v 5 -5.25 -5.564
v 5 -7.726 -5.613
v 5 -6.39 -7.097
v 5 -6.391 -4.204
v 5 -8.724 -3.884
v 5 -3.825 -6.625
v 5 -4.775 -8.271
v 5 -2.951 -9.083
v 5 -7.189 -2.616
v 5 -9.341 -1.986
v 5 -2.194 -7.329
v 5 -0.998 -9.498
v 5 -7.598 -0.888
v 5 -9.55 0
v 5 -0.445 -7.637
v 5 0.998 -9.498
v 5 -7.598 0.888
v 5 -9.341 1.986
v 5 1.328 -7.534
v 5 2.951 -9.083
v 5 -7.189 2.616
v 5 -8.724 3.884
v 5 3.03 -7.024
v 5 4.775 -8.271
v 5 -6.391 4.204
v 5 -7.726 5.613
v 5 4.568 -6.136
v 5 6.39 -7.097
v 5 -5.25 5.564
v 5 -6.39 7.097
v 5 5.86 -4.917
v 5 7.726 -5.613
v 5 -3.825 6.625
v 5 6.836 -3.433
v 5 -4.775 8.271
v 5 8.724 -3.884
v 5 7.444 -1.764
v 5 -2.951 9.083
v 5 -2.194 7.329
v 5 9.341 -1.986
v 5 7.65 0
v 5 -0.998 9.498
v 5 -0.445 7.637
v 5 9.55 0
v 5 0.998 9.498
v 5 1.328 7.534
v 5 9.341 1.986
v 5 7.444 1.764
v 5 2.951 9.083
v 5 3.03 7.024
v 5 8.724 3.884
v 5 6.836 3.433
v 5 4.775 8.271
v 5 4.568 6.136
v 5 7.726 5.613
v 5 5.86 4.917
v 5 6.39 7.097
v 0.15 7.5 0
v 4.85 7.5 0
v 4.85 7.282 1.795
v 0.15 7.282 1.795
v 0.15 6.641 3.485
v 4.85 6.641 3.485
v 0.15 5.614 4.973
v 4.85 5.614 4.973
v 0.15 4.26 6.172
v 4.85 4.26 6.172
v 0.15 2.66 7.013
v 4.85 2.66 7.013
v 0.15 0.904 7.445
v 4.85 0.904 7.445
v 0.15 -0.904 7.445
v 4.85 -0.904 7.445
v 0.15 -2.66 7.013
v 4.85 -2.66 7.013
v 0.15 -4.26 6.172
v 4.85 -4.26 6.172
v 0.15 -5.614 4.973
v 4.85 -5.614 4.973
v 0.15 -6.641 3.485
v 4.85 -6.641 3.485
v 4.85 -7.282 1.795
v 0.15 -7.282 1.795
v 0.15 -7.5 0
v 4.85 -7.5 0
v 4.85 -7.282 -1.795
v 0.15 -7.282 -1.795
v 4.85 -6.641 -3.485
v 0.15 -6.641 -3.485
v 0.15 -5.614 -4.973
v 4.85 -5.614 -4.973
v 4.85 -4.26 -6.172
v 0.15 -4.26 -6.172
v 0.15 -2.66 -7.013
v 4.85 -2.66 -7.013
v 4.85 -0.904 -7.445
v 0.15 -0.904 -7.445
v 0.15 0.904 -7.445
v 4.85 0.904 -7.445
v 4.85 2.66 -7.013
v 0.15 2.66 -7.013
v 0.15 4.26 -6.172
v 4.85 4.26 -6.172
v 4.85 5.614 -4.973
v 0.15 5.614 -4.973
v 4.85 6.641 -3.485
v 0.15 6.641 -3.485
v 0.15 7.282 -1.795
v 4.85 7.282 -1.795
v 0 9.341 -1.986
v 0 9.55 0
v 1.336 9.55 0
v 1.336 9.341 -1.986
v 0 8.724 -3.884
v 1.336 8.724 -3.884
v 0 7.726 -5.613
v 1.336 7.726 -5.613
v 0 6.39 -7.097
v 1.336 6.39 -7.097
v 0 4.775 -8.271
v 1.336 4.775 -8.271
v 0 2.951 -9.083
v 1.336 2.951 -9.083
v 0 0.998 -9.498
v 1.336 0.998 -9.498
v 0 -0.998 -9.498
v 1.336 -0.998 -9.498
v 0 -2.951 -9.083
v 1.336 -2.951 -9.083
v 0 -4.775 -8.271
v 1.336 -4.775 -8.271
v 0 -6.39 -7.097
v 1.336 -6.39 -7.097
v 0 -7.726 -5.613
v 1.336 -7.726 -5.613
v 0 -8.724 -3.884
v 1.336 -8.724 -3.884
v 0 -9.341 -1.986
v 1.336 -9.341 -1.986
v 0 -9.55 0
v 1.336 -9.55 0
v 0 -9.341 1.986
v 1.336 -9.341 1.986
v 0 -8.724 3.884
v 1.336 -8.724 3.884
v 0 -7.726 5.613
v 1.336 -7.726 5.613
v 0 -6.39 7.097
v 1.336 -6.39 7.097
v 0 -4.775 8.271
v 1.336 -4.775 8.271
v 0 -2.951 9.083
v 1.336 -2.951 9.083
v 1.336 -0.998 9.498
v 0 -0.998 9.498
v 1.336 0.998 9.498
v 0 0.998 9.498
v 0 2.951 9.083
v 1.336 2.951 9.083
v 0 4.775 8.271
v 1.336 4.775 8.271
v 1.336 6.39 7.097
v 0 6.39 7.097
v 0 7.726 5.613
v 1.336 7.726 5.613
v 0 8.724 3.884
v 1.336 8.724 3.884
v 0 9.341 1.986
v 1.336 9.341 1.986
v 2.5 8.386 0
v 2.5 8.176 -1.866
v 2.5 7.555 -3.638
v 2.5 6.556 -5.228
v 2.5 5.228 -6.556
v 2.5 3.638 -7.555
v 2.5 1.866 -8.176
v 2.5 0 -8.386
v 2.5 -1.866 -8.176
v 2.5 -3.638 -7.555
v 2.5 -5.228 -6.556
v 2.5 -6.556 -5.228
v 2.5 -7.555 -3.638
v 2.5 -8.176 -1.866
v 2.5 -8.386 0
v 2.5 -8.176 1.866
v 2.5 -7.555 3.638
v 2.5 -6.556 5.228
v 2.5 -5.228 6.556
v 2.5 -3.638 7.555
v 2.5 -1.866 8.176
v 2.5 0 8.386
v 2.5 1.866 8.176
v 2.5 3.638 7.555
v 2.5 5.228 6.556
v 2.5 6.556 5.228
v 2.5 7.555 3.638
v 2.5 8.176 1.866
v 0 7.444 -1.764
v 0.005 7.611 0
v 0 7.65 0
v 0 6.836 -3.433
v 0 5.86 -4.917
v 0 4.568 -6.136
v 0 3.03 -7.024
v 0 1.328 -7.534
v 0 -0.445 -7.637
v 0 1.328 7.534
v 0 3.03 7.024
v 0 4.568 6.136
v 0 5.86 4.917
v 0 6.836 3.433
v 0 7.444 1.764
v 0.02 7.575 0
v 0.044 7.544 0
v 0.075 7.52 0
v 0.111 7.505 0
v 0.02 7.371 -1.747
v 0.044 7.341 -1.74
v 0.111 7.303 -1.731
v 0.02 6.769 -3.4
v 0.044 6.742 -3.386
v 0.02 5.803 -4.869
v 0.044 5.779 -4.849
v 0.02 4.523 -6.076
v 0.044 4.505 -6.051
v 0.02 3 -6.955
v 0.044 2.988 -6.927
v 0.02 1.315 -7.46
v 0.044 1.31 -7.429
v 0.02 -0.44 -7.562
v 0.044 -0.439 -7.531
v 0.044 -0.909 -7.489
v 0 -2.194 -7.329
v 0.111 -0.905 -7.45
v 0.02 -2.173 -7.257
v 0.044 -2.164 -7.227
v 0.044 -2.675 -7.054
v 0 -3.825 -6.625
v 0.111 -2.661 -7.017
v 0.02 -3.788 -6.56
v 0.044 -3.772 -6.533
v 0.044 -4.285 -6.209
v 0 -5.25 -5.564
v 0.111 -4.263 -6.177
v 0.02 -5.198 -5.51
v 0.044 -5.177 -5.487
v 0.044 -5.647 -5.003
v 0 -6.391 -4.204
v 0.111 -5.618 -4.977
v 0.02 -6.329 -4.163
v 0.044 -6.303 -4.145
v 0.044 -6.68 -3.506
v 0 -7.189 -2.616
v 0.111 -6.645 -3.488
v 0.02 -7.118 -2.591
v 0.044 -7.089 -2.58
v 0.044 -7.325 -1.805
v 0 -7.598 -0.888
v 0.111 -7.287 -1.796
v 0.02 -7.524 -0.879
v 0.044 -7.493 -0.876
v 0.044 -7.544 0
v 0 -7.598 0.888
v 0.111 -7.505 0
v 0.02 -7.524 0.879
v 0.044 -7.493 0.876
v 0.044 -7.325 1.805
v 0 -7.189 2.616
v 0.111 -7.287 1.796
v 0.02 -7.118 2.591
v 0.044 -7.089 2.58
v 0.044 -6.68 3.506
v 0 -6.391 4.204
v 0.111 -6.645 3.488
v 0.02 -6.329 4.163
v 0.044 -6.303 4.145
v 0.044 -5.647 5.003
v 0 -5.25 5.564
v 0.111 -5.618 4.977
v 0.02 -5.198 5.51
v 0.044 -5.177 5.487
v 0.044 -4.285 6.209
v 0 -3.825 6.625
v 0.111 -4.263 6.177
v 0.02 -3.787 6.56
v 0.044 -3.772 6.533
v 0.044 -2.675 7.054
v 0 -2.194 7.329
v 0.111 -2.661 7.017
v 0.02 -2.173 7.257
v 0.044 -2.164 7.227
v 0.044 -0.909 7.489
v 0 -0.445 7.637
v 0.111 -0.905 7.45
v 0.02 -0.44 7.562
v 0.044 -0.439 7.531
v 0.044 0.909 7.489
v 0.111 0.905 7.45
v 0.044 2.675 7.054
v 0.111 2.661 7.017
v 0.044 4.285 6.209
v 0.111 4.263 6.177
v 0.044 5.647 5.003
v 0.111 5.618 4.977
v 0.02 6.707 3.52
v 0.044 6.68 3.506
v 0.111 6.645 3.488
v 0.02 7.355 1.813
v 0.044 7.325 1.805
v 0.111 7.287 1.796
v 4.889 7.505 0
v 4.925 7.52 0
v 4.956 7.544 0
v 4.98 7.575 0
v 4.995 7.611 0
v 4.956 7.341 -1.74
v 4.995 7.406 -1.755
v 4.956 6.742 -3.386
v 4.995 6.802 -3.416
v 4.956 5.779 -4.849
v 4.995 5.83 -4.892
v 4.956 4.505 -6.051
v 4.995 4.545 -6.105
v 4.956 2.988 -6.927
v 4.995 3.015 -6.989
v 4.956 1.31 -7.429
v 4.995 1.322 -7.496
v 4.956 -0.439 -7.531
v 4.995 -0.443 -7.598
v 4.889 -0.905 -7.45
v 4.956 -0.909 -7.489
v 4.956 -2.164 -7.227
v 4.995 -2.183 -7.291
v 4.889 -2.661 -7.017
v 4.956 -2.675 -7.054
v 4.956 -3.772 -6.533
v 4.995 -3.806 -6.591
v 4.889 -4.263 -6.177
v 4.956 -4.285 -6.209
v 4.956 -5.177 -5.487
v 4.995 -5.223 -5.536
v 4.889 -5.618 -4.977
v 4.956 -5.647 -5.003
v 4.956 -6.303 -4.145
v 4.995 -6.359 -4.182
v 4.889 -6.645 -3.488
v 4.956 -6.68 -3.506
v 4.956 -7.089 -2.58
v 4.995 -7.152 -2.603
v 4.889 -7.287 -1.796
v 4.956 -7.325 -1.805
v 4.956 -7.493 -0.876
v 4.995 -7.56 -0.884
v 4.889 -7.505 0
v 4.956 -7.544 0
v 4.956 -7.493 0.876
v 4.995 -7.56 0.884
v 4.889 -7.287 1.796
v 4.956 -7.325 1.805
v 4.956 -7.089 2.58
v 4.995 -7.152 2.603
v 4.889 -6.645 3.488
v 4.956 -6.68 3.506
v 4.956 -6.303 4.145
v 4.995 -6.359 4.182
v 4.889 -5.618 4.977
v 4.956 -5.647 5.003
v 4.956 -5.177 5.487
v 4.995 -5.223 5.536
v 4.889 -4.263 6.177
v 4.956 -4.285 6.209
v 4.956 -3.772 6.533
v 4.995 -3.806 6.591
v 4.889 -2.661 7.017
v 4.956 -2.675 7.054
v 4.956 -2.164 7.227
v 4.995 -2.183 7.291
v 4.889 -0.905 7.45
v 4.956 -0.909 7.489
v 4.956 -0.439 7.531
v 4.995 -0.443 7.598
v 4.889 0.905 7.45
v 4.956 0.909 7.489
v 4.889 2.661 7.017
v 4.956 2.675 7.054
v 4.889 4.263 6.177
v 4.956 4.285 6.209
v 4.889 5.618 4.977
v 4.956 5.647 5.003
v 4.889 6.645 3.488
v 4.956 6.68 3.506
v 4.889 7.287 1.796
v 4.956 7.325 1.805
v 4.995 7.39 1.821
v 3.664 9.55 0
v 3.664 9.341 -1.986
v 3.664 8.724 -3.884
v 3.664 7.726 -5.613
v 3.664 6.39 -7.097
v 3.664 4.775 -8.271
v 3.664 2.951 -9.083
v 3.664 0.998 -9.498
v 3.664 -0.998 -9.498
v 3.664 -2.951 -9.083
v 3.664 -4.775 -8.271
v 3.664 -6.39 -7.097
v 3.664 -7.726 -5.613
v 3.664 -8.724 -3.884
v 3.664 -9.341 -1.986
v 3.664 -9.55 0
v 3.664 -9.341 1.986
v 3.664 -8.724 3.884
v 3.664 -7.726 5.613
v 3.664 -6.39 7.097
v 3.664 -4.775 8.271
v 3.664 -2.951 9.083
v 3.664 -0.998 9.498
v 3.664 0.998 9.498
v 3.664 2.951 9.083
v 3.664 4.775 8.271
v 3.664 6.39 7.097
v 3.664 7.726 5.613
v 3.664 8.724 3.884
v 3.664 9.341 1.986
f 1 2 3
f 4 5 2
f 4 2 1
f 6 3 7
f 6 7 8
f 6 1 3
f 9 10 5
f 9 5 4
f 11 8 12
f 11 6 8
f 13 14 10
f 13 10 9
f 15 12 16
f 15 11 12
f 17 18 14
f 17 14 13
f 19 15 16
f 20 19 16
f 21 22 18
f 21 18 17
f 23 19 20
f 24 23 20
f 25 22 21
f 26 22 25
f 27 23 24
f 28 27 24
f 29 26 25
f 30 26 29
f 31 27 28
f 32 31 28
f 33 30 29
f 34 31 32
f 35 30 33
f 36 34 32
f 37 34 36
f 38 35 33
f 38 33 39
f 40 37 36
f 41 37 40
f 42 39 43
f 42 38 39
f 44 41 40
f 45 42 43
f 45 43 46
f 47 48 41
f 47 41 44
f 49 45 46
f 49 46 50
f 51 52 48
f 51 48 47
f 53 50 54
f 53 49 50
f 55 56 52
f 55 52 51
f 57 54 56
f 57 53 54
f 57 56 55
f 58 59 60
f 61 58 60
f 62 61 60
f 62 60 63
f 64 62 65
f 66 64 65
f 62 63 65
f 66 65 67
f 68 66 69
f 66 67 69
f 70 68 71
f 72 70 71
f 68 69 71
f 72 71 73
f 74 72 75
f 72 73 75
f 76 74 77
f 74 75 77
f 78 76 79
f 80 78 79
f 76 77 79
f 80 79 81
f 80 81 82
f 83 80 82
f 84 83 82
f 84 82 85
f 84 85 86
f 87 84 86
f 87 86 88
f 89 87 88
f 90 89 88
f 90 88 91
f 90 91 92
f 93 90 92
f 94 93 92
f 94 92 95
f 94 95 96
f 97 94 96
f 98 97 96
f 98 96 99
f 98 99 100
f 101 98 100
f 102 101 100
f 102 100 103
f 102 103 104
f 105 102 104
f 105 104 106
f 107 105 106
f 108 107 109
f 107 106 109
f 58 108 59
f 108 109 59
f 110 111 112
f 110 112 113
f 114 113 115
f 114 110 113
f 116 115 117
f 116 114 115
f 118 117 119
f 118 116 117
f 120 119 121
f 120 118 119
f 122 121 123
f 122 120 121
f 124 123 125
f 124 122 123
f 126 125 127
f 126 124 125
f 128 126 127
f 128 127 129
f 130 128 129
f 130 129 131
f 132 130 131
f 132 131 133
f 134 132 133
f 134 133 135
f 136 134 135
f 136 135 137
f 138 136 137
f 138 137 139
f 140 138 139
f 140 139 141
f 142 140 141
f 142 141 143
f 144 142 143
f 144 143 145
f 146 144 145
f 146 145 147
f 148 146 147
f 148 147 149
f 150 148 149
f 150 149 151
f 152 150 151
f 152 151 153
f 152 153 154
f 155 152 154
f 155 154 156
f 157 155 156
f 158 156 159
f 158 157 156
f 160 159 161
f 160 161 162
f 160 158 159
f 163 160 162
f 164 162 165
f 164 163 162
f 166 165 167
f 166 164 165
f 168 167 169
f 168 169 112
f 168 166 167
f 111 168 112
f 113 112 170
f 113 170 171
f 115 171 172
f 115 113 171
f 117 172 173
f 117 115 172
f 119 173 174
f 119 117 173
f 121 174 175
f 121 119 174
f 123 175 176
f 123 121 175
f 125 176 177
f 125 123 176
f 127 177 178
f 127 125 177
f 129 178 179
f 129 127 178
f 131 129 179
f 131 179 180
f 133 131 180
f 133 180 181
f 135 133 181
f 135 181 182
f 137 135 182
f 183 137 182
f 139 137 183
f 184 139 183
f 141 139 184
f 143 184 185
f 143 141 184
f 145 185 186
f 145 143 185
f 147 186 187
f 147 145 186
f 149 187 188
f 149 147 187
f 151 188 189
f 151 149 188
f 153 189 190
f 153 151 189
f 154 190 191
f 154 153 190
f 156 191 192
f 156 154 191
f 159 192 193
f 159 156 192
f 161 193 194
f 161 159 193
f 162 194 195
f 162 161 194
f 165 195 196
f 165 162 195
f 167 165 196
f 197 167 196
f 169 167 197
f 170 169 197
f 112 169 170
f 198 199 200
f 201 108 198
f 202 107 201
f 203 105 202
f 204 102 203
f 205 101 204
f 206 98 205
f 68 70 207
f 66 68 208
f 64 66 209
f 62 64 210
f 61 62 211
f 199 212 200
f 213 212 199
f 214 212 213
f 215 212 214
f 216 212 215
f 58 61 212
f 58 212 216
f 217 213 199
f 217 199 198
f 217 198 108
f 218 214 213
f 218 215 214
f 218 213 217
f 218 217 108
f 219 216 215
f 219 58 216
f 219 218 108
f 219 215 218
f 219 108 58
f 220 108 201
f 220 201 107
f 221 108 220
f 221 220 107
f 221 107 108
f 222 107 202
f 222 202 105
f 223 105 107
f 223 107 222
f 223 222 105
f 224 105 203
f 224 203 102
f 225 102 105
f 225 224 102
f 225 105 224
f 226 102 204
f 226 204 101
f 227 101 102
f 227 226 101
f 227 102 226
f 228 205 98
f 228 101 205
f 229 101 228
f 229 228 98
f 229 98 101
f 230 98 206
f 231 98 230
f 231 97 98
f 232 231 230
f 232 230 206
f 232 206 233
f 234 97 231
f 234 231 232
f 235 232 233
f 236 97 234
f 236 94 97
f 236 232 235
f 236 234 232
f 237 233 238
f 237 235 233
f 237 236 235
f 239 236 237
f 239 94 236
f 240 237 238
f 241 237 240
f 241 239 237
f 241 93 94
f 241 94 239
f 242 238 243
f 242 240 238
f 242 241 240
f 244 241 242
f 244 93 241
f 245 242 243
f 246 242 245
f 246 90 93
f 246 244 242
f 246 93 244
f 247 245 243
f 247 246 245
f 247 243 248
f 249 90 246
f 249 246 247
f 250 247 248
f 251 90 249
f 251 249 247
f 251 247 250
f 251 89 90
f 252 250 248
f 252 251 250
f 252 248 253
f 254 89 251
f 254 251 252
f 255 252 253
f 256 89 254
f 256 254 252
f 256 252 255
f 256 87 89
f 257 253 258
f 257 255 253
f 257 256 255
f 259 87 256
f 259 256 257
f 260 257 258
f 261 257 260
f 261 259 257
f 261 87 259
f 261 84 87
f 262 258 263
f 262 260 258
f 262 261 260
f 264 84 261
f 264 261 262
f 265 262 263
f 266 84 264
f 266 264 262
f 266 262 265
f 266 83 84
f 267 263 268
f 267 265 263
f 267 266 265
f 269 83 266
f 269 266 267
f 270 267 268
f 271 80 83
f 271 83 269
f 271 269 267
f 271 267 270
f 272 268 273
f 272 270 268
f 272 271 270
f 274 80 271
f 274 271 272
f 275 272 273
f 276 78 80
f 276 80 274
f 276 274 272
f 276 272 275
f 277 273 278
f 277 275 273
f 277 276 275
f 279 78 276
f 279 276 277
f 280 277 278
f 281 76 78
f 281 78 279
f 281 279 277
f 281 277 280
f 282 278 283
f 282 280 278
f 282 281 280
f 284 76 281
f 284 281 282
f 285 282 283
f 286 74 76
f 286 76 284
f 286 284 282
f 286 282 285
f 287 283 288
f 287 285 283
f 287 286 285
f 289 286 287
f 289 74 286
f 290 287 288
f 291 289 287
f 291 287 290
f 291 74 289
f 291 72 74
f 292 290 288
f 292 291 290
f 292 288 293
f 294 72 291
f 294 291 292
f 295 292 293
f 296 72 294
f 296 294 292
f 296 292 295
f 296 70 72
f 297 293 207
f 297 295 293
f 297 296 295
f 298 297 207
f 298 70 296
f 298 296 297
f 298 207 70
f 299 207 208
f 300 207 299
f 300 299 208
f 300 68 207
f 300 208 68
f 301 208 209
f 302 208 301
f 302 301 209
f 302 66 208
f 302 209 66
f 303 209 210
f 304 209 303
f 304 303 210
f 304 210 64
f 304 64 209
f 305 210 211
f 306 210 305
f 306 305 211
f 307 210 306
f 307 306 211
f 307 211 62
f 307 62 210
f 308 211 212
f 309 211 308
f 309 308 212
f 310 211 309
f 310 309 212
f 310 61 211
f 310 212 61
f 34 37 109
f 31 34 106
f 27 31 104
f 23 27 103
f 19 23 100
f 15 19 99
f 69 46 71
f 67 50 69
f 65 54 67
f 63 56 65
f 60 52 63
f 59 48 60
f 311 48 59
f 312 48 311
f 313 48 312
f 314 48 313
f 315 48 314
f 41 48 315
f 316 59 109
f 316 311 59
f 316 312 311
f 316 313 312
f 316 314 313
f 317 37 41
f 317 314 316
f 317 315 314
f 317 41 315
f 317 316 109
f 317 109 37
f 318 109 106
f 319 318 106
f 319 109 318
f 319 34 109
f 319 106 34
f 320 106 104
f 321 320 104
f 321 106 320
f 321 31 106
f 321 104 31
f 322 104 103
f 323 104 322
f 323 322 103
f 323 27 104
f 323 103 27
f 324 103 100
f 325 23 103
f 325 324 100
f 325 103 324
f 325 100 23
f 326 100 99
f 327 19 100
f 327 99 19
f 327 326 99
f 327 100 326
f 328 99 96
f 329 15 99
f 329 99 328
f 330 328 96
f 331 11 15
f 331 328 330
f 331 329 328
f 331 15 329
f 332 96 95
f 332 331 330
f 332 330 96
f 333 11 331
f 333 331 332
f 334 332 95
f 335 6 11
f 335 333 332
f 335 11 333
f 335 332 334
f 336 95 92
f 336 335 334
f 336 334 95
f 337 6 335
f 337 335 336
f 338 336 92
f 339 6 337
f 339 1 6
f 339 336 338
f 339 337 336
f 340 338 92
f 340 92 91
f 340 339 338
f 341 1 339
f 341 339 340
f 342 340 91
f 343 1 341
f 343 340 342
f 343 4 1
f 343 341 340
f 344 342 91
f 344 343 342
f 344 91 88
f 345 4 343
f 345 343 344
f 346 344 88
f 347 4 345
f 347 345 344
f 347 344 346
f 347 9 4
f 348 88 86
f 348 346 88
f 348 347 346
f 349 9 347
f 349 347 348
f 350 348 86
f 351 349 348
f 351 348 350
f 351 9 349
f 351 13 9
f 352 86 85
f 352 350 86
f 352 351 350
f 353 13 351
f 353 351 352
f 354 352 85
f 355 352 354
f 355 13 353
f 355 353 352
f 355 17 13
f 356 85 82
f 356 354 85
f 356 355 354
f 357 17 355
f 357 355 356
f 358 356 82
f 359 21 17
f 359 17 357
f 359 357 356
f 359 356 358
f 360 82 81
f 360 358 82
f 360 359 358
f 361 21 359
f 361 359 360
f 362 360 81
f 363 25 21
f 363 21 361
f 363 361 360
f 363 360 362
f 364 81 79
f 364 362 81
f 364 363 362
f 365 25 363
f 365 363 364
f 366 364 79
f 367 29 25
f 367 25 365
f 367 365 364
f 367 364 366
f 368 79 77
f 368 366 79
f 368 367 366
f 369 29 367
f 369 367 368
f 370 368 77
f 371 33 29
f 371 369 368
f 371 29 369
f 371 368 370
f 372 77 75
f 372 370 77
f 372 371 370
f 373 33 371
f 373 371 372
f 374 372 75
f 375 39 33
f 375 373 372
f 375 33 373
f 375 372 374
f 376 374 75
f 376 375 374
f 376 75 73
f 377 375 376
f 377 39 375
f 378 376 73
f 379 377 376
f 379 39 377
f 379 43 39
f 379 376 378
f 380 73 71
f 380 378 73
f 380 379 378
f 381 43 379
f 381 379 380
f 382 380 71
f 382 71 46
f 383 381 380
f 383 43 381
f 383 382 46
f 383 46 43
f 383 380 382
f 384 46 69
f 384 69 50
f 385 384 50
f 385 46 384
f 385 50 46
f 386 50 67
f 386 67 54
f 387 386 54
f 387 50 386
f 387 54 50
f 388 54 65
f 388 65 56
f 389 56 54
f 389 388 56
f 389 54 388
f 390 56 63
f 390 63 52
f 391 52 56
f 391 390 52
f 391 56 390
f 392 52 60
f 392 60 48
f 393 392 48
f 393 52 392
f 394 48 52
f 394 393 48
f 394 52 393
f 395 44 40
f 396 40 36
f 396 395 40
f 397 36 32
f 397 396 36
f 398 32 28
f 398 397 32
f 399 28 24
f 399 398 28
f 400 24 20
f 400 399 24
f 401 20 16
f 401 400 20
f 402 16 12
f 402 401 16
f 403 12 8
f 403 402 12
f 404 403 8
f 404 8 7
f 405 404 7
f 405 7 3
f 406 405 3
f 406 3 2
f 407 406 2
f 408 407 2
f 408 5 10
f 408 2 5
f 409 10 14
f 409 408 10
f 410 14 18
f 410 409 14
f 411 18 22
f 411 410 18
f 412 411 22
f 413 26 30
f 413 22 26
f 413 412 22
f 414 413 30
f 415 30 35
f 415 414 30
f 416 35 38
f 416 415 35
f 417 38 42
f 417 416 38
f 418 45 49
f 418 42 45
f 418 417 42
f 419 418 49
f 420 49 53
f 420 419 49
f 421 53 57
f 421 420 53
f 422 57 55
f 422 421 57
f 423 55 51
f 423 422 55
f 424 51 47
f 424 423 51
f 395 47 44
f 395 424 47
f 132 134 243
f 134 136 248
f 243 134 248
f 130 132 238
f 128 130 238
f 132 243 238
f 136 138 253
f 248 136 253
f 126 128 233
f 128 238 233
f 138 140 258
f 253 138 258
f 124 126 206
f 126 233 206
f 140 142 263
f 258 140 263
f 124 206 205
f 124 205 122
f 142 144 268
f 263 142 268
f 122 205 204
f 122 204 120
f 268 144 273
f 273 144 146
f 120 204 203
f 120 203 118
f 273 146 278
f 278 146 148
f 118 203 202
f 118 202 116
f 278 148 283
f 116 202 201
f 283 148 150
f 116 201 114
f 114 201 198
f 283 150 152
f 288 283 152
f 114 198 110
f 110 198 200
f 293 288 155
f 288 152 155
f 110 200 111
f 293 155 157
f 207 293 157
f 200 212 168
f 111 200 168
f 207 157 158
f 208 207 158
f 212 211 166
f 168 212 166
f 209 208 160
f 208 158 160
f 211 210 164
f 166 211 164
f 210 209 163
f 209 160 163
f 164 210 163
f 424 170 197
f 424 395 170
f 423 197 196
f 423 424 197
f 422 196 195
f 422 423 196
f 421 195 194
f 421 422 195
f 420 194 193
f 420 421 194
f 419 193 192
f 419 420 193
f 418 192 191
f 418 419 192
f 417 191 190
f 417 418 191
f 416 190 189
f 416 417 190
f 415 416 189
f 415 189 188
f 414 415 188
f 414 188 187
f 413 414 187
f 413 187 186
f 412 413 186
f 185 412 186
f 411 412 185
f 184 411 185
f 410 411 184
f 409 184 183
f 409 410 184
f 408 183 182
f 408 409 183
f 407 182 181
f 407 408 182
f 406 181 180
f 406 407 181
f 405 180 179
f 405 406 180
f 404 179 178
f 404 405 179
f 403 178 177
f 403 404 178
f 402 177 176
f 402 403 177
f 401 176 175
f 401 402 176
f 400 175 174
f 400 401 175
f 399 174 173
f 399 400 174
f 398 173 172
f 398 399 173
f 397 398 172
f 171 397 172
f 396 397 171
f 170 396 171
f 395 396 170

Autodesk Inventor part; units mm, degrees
ref_plane "YZ Plane" through (0, 0, 0) normal (1, 0, 0) x (0, 1, 0)
ref_plane "XZ Plane" through (0, 0, 0) normal (0, 1, 0) x (-1, 0, 0)
ref_plane "XY Plane" through (0, 0, 0) normal (0, 0, 1) x (1, 0, 0)
sketch "Sketch_1" plane through (0, 0, 0) normal (0, 0, 1) x (1, 0, 0)
  line L0 (5, 0) -> (0, 0)
  arc A0 (0, 7.65) -> (0.15, 7.5) centre (0.15, 7.65) ccw
  line L1 (0.15, 7.5) -> (4.85, 7.5)
  arc A1 (4.85, 7.5) -> (5, 7.65) centre (4.85, 7.65) ccw
  line L2 (5, 7.65) -> (5, 9.55)
  line L3 (5, 9.55) -> (0, 9.55)
  line L4 (0, 9.55) -> (0, 7.65)
revolve "Revolution1" add sketch "Sketch_1" angle 360 about axis through (5, 0, 0) along (1, 0, 0)
sketch "Sketch_2" plane through (0, 0, 0) normal (0, 0, 1) x (1, 0, 0)
  line L0 (3.5, 0) -> (1.5, 0)
  line L1 (1.0858, 9.8) -> (2.5, 8.3858)
  line L2 (2.5, 8.3858) -> (3.9142, 9.8)
  line L3 (3.9142, 9.8) -> (2.5, 11.2142)
  line L4 (2.5, 11.2142) -> (1.0858, 9.8)
revolve "Revolution2" cut sketch "Sketch_2" angle 360 about axis through (3.5, 0, 0) along (1, 0, 0)
properties part number "CRBT155A_PART1" material "ステンレス鋼"
